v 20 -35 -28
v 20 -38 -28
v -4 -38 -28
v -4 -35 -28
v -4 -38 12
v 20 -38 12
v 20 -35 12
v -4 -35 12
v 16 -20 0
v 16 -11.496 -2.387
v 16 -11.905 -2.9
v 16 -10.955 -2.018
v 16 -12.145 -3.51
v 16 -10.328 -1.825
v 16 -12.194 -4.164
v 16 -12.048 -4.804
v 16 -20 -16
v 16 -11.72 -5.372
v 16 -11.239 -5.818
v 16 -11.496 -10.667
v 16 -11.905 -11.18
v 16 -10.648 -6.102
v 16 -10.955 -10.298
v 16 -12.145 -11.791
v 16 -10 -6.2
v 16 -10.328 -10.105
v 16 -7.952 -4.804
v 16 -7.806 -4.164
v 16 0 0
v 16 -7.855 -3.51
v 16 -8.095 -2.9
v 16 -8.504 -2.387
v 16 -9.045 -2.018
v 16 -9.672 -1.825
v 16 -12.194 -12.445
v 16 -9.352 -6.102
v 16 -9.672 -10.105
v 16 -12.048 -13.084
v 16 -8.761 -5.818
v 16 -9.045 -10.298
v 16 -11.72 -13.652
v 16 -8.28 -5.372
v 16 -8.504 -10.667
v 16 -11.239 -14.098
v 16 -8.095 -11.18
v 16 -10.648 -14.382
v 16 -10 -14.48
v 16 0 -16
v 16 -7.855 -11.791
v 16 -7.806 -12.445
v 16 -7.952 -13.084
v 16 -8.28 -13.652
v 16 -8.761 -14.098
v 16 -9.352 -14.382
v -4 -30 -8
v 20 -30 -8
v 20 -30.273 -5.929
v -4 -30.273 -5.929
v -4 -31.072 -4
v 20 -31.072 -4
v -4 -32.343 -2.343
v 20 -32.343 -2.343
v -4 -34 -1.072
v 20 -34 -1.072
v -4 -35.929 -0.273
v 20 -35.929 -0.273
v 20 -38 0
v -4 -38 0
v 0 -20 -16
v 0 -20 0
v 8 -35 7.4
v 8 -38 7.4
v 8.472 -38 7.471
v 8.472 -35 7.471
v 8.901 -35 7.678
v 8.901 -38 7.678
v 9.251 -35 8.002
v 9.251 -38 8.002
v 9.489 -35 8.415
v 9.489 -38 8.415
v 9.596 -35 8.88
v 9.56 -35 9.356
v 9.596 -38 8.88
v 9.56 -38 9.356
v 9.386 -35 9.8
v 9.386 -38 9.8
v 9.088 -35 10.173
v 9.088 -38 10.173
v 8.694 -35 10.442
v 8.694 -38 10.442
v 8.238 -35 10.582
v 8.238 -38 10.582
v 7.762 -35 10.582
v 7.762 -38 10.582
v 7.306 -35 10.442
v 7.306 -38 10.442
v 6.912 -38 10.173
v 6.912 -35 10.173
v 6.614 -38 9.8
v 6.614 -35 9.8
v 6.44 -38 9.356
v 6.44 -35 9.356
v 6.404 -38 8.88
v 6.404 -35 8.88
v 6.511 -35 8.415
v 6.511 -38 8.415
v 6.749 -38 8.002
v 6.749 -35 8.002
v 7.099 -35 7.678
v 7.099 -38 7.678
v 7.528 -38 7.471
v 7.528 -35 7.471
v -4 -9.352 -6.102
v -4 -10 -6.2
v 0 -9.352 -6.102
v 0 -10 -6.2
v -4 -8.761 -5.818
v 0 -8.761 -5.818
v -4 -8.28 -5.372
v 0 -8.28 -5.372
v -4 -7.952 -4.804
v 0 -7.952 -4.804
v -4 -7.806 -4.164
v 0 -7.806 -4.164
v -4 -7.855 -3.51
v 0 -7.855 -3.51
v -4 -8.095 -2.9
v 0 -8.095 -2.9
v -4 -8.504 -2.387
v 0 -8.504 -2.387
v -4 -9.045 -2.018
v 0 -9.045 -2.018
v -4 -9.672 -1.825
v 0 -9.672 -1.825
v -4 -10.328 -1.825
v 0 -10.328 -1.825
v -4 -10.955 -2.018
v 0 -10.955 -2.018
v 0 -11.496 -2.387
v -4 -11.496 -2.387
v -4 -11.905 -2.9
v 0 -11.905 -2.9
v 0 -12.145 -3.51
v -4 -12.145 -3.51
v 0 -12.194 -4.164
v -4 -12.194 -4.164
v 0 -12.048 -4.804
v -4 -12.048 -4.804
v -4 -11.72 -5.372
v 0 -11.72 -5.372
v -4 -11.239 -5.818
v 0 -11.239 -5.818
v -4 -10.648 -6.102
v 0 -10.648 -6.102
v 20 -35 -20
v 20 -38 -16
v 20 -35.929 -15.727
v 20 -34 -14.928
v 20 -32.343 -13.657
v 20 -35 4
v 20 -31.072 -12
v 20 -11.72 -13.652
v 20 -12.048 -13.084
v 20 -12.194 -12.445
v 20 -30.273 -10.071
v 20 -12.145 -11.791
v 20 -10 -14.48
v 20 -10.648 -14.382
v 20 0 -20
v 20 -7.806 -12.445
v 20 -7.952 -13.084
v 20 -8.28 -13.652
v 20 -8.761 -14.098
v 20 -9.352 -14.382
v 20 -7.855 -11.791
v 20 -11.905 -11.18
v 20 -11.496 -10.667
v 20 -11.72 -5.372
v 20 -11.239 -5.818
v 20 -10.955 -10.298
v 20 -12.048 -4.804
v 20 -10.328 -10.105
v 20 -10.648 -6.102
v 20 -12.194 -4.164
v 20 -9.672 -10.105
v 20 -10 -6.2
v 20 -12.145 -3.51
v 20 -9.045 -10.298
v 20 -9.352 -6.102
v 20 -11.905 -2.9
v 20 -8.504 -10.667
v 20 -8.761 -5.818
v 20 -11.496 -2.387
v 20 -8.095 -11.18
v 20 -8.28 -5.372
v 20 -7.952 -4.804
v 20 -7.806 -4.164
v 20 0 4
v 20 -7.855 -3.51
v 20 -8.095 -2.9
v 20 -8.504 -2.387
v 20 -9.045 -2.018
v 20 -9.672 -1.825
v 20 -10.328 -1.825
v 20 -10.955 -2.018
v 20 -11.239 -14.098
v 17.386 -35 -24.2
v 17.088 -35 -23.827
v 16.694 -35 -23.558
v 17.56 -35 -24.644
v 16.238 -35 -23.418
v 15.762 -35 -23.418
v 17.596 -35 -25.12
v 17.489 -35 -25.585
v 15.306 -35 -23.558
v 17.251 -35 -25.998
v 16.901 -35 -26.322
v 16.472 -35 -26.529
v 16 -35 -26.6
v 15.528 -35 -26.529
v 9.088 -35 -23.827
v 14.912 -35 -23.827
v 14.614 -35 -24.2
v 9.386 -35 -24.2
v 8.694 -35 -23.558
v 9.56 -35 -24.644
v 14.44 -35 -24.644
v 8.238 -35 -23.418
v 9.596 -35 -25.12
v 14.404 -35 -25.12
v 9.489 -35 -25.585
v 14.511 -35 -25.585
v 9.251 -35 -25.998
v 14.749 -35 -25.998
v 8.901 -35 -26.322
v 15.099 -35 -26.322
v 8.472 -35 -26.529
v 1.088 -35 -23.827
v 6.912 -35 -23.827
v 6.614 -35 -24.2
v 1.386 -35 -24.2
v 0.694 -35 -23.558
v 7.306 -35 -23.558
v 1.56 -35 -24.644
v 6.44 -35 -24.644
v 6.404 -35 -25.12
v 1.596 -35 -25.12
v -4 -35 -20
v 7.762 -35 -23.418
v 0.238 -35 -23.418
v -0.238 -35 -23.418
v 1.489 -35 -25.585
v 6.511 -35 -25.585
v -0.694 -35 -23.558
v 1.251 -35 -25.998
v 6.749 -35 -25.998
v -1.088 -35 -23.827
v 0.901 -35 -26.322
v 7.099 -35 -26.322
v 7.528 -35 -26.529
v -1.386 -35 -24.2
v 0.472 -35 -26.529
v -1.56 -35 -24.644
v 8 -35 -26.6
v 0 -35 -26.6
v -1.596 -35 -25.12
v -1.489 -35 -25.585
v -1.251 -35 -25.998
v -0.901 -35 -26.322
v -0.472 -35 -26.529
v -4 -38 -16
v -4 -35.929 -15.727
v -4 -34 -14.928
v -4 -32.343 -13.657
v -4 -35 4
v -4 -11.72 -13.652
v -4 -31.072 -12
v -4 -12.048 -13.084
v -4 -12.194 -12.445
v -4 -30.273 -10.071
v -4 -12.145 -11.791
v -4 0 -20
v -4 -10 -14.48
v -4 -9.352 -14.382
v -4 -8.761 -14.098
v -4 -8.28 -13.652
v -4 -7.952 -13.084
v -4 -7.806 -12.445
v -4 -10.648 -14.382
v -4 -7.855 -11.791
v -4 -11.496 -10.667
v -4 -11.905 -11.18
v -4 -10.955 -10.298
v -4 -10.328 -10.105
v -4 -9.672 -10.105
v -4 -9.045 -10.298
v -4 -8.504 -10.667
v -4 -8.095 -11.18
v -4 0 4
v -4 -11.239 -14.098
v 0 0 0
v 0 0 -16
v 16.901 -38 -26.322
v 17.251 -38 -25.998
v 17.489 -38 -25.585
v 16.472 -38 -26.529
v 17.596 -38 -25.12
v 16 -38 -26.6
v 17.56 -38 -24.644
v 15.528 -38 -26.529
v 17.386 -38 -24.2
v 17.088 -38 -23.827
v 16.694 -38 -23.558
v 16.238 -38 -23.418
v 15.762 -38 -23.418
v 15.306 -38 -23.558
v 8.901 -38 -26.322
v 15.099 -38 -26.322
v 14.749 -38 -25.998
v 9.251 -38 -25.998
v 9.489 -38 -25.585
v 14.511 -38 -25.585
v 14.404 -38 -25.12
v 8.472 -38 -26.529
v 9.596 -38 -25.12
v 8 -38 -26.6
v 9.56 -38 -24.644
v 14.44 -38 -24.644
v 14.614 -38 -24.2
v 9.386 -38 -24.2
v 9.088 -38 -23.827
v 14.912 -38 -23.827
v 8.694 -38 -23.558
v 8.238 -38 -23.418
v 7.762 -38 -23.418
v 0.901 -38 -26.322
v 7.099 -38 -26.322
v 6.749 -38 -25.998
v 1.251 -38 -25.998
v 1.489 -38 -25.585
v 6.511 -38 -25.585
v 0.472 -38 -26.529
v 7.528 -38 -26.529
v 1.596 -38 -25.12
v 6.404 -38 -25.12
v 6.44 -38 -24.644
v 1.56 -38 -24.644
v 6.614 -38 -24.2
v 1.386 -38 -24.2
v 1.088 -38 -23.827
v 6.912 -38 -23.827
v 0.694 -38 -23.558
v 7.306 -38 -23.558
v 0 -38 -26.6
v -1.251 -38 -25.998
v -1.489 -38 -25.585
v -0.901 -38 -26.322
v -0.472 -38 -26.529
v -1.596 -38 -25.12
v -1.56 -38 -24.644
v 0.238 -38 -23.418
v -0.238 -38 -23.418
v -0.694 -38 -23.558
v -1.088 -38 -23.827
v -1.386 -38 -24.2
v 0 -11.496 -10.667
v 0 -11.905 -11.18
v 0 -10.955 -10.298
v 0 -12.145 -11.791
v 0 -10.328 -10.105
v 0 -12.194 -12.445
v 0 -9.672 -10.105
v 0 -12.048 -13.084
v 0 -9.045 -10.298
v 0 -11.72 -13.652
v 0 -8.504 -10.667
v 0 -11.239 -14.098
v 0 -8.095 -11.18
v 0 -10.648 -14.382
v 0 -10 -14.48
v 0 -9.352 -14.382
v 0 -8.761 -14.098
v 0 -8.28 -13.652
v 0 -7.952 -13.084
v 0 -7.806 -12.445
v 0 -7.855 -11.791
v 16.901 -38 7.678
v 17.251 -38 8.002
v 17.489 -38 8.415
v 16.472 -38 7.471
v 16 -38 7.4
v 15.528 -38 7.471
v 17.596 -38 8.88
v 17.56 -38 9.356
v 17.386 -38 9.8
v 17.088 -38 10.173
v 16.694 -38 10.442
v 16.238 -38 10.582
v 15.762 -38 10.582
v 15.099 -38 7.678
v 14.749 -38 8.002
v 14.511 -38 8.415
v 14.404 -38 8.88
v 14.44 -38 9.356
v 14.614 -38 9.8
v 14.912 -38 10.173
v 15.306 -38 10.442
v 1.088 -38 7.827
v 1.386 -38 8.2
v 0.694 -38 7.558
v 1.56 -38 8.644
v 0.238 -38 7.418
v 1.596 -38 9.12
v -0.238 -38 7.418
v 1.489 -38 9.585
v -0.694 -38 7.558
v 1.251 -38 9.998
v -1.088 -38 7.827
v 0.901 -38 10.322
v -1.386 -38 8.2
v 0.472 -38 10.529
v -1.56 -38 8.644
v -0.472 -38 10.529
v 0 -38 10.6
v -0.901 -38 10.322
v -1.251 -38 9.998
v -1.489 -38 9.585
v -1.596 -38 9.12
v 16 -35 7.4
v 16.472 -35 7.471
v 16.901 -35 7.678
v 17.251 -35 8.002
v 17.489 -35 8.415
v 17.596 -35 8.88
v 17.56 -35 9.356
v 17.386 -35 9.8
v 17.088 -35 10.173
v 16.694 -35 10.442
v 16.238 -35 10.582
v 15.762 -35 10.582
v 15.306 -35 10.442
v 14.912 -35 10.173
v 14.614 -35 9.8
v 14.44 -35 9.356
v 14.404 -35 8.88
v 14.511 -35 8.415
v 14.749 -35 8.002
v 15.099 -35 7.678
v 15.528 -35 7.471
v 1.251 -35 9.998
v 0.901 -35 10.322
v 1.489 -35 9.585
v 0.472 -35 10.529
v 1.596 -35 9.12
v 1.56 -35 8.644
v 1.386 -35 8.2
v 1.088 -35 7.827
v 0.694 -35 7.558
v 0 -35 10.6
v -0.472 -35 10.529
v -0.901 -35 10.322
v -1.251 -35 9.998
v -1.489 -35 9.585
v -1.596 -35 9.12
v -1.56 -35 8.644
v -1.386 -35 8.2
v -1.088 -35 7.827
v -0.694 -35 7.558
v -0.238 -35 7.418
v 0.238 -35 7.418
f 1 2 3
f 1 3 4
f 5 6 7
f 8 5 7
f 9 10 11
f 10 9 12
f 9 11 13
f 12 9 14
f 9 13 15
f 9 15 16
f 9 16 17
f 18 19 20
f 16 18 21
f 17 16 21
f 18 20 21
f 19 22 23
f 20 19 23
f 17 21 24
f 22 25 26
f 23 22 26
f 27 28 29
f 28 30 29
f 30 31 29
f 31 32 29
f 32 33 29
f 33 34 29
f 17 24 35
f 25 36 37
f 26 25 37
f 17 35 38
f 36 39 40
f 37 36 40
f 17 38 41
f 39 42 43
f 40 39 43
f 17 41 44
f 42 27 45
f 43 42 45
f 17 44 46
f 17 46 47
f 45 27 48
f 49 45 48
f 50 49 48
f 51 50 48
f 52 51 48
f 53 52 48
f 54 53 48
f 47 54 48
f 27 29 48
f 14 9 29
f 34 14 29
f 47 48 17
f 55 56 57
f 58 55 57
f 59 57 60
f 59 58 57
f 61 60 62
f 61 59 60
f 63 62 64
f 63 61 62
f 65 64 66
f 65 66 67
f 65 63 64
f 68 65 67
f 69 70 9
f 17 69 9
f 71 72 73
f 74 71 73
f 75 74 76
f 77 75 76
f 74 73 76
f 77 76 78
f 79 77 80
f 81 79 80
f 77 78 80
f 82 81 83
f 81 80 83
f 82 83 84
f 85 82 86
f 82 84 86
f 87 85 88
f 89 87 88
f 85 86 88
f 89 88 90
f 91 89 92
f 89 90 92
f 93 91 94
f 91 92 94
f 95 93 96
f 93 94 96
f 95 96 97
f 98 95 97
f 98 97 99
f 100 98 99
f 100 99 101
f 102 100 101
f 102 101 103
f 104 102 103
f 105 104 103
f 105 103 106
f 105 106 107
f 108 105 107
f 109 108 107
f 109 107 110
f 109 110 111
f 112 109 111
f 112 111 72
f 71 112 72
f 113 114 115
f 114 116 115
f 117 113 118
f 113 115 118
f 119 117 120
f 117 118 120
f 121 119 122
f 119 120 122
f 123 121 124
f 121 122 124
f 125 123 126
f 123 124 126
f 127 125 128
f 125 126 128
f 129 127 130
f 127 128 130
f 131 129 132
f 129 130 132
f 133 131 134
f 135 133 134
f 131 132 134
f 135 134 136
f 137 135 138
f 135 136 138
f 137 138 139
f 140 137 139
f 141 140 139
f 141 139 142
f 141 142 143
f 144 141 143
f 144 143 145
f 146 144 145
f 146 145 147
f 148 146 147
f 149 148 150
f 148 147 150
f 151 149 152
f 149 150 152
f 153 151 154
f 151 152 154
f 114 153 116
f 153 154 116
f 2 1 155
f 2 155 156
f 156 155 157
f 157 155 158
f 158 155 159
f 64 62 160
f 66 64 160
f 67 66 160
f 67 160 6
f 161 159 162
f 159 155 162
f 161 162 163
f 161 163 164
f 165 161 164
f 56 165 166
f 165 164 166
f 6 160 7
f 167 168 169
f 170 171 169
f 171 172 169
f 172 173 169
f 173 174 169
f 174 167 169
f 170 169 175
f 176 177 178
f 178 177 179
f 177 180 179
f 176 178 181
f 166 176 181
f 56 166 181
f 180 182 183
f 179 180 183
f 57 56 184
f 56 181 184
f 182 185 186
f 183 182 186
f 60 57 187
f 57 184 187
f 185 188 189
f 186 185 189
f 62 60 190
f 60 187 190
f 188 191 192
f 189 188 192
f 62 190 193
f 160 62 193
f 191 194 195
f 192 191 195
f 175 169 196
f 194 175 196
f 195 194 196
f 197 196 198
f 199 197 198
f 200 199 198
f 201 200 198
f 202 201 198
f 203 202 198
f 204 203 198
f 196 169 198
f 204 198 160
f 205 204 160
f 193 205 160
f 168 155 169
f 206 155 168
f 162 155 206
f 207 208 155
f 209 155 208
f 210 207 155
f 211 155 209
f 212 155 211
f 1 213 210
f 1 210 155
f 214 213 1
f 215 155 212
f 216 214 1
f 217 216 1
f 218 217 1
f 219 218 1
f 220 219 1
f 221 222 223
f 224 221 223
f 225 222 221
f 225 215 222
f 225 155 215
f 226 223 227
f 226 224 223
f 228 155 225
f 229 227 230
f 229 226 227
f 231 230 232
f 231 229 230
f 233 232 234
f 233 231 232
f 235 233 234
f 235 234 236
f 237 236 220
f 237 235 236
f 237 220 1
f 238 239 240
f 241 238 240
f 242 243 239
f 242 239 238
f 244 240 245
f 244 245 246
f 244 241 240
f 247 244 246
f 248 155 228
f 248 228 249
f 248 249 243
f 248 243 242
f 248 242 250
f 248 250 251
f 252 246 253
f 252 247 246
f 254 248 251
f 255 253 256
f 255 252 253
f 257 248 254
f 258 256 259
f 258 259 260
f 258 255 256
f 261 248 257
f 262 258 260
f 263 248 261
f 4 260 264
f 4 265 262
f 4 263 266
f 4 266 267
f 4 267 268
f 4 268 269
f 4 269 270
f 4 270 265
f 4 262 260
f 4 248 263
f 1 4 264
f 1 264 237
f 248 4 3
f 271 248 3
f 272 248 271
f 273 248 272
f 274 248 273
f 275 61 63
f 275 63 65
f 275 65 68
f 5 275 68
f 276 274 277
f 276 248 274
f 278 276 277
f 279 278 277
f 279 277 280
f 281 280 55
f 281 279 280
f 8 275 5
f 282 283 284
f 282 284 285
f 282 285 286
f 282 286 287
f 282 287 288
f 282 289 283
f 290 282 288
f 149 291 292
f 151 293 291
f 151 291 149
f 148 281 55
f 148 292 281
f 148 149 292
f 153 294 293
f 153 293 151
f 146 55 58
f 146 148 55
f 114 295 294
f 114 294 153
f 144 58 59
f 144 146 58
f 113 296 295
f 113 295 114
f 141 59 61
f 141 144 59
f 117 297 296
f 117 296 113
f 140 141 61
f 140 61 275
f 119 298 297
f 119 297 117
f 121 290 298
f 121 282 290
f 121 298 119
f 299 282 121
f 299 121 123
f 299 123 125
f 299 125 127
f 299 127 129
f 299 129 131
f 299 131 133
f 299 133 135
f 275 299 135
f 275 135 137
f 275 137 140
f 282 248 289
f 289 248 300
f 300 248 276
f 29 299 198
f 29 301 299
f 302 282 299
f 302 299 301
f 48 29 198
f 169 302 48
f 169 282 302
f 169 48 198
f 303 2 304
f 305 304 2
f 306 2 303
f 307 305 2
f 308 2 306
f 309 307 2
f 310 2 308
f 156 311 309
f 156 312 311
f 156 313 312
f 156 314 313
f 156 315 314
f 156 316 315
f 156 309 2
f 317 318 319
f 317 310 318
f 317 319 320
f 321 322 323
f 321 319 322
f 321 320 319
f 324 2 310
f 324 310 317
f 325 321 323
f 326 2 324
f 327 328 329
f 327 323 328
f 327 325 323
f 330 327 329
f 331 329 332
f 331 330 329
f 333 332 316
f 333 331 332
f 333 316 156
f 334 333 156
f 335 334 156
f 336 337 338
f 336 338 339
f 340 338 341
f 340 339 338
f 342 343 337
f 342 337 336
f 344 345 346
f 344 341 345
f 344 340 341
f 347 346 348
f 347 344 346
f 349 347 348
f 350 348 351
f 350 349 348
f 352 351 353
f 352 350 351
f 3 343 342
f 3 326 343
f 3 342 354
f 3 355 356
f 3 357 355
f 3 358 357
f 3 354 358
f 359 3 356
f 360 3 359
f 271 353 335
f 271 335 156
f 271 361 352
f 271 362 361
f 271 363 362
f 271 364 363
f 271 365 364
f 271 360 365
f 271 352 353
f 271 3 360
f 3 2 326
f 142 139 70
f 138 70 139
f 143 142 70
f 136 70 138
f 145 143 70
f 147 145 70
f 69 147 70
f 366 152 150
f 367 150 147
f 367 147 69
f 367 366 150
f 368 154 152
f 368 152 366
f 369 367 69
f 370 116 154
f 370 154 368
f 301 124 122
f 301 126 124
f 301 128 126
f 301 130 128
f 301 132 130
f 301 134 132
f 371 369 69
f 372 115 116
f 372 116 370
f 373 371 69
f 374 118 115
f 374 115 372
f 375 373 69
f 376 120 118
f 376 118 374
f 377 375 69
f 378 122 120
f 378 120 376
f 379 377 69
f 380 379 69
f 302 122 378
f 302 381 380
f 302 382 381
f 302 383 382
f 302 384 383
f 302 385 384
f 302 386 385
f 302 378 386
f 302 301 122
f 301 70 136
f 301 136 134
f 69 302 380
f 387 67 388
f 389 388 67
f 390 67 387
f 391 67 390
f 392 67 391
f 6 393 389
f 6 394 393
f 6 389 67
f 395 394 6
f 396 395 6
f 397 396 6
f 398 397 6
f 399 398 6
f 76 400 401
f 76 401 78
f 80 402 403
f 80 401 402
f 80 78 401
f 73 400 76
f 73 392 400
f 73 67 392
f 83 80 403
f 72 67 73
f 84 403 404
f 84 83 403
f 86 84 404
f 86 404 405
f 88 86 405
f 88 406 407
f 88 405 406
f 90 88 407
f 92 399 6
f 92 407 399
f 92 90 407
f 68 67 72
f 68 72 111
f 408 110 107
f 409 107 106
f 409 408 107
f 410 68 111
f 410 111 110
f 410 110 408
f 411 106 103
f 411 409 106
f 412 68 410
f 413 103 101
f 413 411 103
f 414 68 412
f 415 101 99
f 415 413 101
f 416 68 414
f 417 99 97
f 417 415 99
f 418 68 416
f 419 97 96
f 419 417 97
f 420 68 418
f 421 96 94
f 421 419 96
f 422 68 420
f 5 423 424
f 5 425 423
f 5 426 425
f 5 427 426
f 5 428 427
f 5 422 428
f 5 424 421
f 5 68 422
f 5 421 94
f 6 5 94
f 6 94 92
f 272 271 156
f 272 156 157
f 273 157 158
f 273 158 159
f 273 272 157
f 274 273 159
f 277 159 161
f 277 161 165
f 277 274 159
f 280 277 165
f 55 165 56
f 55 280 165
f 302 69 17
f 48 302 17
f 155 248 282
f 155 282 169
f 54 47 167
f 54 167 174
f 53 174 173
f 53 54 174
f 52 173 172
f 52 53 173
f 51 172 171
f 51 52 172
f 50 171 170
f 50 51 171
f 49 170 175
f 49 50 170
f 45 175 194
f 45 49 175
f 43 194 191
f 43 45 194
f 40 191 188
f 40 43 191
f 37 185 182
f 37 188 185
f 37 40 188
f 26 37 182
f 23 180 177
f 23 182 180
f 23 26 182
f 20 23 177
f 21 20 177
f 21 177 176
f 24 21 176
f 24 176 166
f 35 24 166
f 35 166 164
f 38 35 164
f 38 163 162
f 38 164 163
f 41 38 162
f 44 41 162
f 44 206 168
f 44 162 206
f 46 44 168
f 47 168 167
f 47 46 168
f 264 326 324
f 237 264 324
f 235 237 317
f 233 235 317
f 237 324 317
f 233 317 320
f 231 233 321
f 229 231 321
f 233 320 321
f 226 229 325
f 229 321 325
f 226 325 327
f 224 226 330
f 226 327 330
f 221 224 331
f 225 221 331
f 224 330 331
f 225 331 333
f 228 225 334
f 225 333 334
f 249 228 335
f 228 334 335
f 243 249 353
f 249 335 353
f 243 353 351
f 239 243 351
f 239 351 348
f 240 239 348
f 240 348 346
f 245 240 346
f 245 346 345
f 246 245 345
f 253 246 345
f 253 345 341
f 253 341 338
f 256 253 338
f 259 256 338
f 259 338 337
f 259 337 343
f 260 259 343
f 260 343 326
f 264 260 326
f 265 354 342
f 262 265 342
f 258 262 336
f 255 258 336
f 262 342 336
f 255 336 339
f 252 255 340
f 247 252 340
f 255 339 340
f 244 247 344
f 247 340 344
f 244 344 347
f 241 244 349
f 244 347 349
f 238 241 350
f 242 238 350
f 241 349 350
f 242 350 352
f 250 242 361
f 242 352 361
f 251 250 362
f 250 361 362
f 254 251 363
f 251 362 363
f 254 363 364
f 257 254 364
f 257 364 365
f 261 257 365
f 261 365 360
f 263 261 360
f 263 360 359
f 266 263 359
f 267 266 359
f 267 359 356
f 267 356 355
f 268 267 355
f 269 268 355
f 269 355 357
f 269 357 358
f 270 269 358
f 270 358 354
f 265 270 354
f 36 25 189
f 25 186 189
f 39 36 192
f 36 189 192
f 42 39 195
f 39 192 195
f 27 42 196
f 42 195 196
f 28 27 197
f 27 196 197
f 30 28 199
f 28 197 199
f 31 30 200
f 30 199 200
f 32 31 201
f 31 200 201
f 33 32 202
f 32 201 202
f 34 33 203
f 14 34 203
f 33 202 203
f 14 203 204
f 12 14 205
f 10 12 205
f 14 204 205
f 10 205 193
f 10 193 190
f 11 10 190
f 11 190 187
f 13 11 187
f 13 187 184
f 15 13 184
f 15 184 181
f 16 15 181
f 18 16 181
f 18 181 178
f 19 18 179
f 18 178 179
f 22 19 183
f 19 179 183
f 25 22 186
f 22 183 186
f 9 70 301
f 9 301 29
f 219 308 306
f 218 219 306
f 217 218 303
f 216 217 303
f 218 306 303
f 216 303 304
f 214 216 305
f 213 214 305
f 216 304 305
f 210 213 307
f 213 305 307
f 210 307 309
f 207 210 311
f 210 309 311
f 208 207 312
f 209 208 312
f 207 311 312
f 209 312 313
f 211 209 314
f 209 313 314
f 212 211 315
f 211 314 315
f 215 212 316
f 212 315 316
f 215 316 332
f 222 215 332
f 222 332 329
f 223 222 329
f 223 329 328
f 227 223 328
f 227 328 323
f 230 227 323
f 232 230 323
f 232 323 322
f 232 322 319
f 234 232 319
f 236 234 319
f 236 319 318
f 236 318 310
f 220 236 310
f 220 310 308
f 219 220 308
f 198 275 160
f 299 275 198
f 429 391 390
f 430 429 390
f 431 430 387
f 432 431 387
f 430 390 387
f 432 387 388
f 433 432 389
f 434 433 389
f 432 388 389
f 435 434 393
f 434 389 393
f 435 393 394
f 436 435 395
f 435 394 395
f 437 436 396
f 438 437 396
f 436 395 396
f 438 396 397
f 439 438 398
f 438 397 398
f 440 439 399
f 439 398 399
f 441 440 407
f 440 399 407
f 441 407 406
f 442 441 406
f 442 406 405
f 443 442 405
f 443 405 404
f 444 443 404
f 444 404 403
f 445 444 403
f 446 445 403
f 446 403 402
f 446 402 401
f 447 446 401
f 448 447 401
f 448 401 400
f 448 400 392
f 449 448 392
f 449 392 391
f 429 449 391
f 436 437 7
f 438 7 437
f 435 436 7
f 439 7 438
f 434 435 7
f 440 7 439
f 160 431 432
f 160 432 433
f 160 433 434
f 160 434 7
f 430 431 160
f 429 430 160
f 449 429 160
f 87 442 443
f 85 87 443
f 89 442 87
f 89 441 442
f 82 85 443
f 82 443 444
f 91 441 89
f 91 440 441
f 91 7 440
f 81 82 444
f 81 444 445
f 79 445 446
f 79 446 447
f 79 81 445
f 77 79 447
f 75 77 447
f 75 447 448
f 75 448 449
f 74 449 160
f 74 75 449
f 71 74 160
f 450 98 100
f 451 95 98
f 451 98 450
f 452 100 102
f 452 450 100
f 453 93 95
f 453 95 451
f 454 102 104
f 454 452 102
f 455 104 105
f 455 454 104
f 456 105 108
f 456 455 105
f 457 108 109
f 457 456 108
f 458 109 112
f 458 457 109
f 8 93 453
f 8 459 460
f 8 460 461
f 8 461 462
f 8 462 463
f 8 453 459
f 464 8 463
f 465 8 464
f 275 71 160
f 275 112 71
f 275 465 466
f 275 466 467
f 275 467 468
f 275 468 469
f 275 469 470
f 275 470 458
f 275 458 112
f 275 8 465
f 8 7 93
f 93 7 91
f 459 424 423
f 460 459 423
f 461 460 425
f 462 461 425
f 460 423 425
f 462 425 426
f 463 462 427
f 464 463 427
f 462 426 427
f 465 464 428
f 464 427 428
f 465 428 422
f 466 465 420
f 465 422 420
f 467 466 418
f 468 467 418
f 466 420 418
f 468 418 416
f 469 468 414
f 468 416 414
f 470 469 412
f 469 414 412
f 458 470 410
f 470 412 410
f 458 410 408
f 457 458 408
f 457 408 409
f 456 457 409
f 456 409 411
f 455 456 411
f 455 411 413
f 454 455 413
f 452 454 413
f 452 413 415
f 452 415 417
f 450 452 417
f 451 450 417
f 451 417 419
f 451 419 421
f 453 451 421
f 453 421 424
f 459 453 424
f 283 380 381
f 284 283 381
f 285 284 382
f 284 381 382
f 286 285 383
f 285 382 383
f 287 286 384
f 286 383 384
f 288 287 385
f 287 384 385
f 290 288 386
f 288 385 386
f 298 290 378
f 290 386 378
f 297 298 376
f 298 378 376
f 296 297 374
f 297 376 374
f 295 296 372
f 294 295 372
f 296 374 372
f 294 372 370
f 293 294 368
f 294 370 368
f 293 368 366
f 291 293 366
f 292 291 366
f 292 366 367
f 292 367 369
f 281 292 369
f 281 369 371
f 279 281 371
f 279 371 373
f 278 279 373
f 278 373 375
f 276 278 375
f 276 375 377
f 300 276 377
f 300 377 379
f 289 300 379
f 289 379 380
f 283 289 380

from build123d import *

# Parameters (mm, degrees)
SKETCH_1_W          = 16
SKETCH_1_H          = 16
EXTRUDE_1_DEPTH     = 20
SKETCH_2_W          = 24
SKETCH_2_H          = 24
EXTRUDE_4_DEPTH     = 10
SKETCH_3_W          = 4
SKETCH_3_H          = 3
EXTRUDE_6_DEPTH     = 24
SKETCH_5_R          = 1.6
CUT_EXTRUDE_1_DEPTH = 24
SKETCH_6_R          = 2.2
CUT_EXTRUDE_2_DEPTH = 25


with BuildPart() as part:
    # 草图1 → 凸台-拉伸1 (new body)
    with BuildSketch(Plane(origin=(0, 0, 0), x_dir=(1, 0, 0), z_dir=(0, 1, 0))):
        Polygon((-4, 20), (-4, 16), (-4, -4), (16, -4), (20, -4), (20, 0), (20, 20), (0, 20), align=None)
        with Locations((8, 8)):
            Rectangle(SKETCH_1_W, SKETCH_1_H, mode=Mode.SUBTRACT)
    extrude(amount=-EXTRUDE_1_DEPTH)

    # 草图2 → 凸台-拉伸4 (add)
    with BuildSketch(Plane.XZ.offset(20)):
        with Locations((8, -8)):
            Rectangle(SKETCH_2_W, SKETCH_2_H)
    extrude(amount=EXTRUDE_4_DEPTH)

    # 草图3 → 凸台-拉伸6 (add)
    with BuildSketch(Plane.ZY.offset(4)):
        with Locations((10, -36.5)):
            Rectangle(SKETCH_3_W, SKETCH_3_H)
        with BuildLine():
            Line((4, -35), (4, -30))
            Line((4, -30), (-8.000000062, -30))
            ThreePointArc((-8.000000062, -30), (-2.343145773, -32.343145728), (0, -38))
            Line((0, -38), (8, -38))
            Line((8, -38), (8, -35))
            Line((8, -35), (4, -35))
        make_face()
        with BuildLine():
            ThreePointArc((-16, -38), (-13.656854272, -32.343145773), (-8.000000062, -30))
            Line((-8.000000062, -30), (-20, -30))
            Line((-20, -30), (-20, -35))
            Line((-20, -35), (-24, -35))
            Line((-24, -35), (-24, -38))
            Line((-24, -38), (-16, -38))
        make_face()
        with Locations((-26, -36.5)):
            Rectangle(SKETCH_3_W, SKETCH_3_H)
    extrude(amount=-EXTRUDE_6_DEPTH)

    # 草图5 → 切除-拉伸1 (cut)
    with BuildSketch(Plane.XZ.offset(38)):
        with Locations(Location((8, 9, 0), (0, 0, 270))):
            Circle(SKETCH_5_R)
        with Locations(Location((16, 9, 0), (0, 0, 270))):
            Circle(SKETCH_5_R)
        with Locations(Location((0, 9, 0), (0, 0, 90))):
            Circle(SKETCH_5_R)
        with Locations(Location((0, -25, 0), (0, 0, 270))):
            Circle(SKETCH_5_R)
        with Locations(Location((8, -25, 0), (0, 0, 270))):
            Circle(SKETCH_5_R)
        with Locations(Location((16, -25, 0), (0, 0, 270))):
            Circle(SKETCH_5_R)
    extrude(amount=-CUT_EXTRUDE_1_DEPTH, mode=Mode.SUBTRACT)

    # 草图6 → 切除-拉伸2 (cut, symmetric)
    with BuildSketch(Plane(origin=(0, 0, 0), x_dir=(0, 0, -1), z_dir=(1, 0, 0))):
        with Locations((12.280139498, -10)):
            Circle(SKETCH_6_R)
        with Locations((4, -10)):
            Circle(SKETCH_6_R)
    extrude(amount=CUT_EXTRUDE_2_DEPTH, both=True, mode=Mode.SUBTRACT)


solid = part.part
